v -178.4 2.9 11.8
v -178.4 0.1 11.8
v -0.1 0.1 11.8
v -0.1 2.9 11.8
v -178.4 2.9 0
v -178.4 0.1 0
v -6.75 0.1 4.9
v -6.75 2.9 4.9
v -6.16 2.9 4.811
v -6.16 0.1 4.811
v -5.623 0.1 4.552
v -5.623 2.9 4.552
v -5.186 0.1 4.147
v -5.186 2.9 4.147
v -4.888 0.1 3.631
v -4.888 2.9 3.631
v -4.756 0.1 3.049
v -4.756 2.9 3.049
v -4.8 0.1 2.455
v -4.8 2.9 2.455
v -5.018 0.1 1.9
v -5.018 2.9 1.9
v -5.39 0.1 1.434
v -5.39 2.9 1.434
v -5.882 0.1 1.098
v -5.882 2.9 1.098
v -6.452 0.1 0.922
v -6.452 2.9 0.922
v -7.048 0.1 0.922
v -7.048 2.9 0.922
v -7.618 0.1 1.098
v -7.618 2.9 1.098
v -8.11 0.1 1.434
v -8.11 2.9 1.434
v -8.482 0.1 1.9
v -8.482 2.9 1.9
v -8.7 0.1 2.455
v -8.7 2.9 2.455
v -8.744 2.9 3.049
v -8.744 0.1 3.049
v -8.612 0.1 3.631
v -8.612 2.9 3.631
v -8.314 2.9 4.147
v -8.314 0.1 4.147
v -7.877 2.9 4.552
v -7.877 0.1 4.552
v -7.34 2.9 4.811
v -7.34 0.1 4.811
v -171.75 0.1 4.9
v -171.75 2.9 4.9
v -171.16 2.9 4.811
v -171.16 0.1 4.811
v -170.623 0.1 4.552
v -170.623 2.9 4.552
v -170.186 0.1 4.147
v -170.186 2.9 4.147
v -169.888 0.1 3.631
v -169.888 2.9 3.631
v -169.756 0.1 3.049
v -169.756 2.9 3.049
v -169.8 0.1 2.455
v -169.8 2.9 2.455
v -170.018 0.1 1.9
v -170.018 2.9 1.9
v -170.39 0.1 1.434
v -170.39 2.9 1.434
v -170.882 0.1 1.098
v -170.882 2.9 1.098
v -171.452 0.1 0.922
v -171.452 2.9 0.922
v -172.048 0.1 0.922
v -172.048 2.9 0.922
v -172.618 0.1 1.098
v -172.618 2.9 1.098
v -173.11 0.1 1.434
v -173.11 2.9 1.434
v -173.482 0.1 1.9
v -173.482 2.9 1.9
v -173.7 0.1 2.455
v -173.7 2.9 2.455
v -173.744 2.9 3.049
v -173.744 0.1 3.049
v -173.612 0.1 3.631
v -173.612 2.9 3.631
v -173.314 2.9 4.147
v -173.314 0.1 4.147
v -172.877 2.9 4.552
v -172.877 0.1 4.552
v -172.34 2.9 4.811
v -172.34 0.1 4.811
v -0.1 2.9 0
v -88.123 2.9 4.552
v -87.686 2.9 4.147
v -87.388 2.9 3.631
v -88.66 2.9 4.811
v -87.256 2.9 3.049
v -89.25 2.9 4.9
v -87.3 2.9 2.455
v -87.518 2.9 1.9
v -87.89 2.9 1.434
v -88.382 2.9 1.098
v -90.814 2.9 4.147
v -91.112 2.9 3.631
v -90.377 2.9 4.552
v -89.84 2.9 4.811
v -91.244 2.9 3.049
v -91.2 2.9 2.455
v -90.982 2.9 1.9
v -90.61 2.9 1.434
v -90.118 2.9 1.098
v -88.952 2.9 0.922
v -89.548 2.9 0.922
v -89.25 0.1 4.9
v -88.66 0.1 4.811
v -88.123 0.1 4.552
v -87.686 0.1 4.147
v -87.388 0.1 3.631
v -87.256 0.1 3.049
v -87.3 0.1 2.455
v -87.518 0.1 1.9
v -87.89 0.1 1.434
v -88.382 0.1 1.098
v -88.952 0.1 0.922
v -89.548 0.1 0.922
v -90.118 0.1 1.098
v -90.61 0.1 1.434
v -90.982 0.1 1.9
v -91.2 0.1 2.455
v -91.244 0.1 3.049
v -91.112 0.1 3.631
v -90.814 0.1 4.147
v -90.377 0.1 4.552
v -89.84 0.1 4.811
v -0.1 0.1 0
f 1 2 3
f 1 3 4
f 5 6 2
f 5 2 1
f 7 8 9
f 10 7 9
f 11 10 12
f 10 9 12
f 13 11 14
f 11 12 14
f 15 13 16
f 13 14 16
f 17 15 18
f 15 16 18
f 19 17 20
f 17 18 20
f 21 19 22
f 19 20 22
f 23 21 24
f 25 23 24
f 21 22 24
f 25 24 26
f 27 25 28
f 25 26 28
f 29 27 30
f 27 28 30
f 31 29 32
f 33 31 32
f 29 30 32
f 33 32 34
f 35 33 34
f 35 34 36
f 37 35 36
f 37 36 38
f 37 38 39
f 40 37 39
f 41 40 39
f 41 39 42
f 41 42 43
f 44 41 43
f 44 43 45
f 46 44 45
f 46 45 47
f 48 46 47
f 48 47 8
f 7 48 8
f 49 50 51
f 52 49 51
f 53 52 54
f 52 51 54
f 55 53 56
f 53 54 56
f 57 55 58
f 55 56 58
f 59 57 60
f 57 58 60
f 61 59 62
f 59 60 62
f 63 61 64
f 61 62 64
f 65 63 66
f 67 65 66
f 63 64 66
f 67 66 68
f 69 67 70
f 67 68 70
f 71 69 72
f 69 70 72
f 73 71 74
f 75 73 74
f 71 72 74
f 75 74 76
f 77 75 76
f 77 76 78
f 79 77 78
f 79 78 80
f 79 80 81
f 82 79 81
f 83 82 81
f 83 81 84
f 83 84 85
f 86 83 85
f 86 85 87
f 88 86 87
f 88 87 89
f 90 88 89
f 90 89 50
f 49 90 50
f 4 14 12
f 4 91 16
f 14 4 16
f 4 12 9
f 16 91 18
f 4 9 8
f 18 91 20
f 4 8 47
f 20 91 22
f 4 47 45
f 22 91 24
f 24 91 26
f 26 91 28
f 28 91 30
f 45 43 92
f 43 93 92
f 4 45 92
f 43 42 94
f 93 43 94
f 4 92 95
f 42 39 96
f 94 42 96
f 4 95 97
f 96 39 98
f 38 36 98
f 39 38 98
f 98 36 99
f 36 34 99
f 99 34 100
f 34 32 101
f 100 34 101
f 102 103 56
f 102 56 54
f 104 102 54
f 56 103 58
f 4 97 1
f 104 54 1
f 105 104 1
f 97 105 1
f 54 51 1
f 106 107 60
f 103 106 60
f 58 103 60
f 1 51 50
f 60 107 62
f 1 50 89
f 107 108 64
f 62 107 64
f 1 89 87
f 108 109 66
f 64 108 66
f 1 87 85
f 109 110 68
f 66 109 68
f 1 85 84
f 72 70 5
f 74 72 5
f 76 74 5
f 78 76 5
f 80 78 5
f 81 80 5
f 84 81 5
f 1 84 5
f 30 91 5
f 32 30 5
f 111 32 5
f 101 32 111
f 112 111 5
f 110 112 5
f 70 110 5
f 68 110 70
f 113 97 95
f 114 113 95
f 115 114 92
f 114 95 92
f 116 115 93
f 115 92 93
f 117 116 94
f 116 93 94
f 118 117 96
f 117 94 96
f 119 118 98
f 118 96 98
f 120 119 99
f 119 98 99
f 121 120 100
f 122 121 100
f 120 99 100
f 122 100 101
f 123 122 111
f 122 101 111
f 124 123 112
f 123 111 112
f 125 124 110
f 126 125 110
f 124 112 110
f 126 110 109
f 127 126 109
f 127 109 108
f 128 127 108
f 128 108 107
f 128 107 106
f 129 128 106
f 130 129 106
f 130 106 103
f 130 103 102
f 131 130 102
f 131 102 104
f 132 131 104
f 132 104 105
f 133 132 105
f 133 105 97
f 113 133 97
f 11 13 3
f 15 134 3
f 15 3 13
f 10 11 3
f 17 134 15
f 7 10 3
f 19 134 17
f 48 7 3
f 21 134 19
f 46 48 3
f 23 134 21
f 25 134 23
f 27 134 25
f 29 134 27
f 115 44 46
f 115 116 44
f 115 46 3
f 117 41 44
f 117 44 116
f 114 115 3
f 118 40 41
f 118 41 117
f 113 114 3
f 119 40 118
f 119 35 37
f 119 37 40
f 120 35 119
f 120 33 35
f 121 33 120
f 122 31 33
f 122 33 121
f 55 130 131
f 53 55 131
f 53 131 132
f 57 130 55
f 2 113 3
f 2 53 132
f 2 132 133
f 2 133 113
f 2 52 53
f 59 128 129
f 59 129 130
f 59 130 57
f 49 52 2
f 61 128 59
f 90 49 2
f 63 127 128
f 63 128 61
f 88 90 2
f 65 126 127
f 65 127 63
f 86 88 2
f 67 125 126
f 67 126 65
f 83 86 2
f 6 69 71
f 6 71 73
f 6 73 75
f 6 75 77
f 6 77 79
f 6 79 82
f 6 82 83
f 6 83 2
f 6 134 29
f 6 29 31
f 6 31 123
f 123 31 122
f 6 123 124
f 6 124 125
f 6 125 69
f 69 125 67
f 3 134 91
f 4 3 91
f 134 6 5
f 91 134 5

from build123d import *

# Parameters (mm, degrees)
SKETCH1_W           = 2.8
SKETCH1_H           = 178.3
BOSS_EXTRUDE1_DEPTH = 11.8
CUT_EXTRUDE1_REACH  = 180.812
SKETCH2_R           = 2
LPATTERN1_COUNT     = 3
LPATTERN1_PITCH     = 82.5


with BuildPart() as part:
    # Sketch1 → Boss-Extrude1 (new body)
    with BuildSketch(Plane(origin=(0, 0, 0), x_dir=(0, 1, 0), z_dir=(0, 0, 1))):
        with Locations((1.5, 89.25)):
            Rectangle(SKETCH1_W, SKETCH1_H)
    extrude(amount=BOSS_EXTRUDE1_DEPTH)

    # Sketch2 → Cut-Extrude1 (cut, up to next)
    with BuildSketch(Plane(origin=(0, 2.9, 0), x_dir=(-1, 0, 0), z_dir=(0, 1, 0)), mode=Mode.PRIVATE) as cut_extrude1_sk1:
        with Locations(Location((171.75, 2.9, 0), (0, 0, 90))):
            Circle(SKETCH2_R)
    cut_extrude1_tool1 = extrude(cut_extrude1_sk1.sketch, amount=-CUT_EXTRUDE1_REACH, mode=Mode.PRIVATE) & part.part
    cut_extrude1 = cut_extrude1_tool1.solids().sort_by_distance((-171.75, 2.9, 2.9))[0]
    add(cut_extrude1, mode=Mode.SUBTRACT)

    # LPattern1: Cut-Extrude1 ×3
    with Locations(*[(i * LPATTERN1_PITCH, 0, 0) for i in range(1, LPATTERN1_COUNT)]):
        add(cut_extrude1, mode=Mode.SUBTRACT)


solid = part.part
